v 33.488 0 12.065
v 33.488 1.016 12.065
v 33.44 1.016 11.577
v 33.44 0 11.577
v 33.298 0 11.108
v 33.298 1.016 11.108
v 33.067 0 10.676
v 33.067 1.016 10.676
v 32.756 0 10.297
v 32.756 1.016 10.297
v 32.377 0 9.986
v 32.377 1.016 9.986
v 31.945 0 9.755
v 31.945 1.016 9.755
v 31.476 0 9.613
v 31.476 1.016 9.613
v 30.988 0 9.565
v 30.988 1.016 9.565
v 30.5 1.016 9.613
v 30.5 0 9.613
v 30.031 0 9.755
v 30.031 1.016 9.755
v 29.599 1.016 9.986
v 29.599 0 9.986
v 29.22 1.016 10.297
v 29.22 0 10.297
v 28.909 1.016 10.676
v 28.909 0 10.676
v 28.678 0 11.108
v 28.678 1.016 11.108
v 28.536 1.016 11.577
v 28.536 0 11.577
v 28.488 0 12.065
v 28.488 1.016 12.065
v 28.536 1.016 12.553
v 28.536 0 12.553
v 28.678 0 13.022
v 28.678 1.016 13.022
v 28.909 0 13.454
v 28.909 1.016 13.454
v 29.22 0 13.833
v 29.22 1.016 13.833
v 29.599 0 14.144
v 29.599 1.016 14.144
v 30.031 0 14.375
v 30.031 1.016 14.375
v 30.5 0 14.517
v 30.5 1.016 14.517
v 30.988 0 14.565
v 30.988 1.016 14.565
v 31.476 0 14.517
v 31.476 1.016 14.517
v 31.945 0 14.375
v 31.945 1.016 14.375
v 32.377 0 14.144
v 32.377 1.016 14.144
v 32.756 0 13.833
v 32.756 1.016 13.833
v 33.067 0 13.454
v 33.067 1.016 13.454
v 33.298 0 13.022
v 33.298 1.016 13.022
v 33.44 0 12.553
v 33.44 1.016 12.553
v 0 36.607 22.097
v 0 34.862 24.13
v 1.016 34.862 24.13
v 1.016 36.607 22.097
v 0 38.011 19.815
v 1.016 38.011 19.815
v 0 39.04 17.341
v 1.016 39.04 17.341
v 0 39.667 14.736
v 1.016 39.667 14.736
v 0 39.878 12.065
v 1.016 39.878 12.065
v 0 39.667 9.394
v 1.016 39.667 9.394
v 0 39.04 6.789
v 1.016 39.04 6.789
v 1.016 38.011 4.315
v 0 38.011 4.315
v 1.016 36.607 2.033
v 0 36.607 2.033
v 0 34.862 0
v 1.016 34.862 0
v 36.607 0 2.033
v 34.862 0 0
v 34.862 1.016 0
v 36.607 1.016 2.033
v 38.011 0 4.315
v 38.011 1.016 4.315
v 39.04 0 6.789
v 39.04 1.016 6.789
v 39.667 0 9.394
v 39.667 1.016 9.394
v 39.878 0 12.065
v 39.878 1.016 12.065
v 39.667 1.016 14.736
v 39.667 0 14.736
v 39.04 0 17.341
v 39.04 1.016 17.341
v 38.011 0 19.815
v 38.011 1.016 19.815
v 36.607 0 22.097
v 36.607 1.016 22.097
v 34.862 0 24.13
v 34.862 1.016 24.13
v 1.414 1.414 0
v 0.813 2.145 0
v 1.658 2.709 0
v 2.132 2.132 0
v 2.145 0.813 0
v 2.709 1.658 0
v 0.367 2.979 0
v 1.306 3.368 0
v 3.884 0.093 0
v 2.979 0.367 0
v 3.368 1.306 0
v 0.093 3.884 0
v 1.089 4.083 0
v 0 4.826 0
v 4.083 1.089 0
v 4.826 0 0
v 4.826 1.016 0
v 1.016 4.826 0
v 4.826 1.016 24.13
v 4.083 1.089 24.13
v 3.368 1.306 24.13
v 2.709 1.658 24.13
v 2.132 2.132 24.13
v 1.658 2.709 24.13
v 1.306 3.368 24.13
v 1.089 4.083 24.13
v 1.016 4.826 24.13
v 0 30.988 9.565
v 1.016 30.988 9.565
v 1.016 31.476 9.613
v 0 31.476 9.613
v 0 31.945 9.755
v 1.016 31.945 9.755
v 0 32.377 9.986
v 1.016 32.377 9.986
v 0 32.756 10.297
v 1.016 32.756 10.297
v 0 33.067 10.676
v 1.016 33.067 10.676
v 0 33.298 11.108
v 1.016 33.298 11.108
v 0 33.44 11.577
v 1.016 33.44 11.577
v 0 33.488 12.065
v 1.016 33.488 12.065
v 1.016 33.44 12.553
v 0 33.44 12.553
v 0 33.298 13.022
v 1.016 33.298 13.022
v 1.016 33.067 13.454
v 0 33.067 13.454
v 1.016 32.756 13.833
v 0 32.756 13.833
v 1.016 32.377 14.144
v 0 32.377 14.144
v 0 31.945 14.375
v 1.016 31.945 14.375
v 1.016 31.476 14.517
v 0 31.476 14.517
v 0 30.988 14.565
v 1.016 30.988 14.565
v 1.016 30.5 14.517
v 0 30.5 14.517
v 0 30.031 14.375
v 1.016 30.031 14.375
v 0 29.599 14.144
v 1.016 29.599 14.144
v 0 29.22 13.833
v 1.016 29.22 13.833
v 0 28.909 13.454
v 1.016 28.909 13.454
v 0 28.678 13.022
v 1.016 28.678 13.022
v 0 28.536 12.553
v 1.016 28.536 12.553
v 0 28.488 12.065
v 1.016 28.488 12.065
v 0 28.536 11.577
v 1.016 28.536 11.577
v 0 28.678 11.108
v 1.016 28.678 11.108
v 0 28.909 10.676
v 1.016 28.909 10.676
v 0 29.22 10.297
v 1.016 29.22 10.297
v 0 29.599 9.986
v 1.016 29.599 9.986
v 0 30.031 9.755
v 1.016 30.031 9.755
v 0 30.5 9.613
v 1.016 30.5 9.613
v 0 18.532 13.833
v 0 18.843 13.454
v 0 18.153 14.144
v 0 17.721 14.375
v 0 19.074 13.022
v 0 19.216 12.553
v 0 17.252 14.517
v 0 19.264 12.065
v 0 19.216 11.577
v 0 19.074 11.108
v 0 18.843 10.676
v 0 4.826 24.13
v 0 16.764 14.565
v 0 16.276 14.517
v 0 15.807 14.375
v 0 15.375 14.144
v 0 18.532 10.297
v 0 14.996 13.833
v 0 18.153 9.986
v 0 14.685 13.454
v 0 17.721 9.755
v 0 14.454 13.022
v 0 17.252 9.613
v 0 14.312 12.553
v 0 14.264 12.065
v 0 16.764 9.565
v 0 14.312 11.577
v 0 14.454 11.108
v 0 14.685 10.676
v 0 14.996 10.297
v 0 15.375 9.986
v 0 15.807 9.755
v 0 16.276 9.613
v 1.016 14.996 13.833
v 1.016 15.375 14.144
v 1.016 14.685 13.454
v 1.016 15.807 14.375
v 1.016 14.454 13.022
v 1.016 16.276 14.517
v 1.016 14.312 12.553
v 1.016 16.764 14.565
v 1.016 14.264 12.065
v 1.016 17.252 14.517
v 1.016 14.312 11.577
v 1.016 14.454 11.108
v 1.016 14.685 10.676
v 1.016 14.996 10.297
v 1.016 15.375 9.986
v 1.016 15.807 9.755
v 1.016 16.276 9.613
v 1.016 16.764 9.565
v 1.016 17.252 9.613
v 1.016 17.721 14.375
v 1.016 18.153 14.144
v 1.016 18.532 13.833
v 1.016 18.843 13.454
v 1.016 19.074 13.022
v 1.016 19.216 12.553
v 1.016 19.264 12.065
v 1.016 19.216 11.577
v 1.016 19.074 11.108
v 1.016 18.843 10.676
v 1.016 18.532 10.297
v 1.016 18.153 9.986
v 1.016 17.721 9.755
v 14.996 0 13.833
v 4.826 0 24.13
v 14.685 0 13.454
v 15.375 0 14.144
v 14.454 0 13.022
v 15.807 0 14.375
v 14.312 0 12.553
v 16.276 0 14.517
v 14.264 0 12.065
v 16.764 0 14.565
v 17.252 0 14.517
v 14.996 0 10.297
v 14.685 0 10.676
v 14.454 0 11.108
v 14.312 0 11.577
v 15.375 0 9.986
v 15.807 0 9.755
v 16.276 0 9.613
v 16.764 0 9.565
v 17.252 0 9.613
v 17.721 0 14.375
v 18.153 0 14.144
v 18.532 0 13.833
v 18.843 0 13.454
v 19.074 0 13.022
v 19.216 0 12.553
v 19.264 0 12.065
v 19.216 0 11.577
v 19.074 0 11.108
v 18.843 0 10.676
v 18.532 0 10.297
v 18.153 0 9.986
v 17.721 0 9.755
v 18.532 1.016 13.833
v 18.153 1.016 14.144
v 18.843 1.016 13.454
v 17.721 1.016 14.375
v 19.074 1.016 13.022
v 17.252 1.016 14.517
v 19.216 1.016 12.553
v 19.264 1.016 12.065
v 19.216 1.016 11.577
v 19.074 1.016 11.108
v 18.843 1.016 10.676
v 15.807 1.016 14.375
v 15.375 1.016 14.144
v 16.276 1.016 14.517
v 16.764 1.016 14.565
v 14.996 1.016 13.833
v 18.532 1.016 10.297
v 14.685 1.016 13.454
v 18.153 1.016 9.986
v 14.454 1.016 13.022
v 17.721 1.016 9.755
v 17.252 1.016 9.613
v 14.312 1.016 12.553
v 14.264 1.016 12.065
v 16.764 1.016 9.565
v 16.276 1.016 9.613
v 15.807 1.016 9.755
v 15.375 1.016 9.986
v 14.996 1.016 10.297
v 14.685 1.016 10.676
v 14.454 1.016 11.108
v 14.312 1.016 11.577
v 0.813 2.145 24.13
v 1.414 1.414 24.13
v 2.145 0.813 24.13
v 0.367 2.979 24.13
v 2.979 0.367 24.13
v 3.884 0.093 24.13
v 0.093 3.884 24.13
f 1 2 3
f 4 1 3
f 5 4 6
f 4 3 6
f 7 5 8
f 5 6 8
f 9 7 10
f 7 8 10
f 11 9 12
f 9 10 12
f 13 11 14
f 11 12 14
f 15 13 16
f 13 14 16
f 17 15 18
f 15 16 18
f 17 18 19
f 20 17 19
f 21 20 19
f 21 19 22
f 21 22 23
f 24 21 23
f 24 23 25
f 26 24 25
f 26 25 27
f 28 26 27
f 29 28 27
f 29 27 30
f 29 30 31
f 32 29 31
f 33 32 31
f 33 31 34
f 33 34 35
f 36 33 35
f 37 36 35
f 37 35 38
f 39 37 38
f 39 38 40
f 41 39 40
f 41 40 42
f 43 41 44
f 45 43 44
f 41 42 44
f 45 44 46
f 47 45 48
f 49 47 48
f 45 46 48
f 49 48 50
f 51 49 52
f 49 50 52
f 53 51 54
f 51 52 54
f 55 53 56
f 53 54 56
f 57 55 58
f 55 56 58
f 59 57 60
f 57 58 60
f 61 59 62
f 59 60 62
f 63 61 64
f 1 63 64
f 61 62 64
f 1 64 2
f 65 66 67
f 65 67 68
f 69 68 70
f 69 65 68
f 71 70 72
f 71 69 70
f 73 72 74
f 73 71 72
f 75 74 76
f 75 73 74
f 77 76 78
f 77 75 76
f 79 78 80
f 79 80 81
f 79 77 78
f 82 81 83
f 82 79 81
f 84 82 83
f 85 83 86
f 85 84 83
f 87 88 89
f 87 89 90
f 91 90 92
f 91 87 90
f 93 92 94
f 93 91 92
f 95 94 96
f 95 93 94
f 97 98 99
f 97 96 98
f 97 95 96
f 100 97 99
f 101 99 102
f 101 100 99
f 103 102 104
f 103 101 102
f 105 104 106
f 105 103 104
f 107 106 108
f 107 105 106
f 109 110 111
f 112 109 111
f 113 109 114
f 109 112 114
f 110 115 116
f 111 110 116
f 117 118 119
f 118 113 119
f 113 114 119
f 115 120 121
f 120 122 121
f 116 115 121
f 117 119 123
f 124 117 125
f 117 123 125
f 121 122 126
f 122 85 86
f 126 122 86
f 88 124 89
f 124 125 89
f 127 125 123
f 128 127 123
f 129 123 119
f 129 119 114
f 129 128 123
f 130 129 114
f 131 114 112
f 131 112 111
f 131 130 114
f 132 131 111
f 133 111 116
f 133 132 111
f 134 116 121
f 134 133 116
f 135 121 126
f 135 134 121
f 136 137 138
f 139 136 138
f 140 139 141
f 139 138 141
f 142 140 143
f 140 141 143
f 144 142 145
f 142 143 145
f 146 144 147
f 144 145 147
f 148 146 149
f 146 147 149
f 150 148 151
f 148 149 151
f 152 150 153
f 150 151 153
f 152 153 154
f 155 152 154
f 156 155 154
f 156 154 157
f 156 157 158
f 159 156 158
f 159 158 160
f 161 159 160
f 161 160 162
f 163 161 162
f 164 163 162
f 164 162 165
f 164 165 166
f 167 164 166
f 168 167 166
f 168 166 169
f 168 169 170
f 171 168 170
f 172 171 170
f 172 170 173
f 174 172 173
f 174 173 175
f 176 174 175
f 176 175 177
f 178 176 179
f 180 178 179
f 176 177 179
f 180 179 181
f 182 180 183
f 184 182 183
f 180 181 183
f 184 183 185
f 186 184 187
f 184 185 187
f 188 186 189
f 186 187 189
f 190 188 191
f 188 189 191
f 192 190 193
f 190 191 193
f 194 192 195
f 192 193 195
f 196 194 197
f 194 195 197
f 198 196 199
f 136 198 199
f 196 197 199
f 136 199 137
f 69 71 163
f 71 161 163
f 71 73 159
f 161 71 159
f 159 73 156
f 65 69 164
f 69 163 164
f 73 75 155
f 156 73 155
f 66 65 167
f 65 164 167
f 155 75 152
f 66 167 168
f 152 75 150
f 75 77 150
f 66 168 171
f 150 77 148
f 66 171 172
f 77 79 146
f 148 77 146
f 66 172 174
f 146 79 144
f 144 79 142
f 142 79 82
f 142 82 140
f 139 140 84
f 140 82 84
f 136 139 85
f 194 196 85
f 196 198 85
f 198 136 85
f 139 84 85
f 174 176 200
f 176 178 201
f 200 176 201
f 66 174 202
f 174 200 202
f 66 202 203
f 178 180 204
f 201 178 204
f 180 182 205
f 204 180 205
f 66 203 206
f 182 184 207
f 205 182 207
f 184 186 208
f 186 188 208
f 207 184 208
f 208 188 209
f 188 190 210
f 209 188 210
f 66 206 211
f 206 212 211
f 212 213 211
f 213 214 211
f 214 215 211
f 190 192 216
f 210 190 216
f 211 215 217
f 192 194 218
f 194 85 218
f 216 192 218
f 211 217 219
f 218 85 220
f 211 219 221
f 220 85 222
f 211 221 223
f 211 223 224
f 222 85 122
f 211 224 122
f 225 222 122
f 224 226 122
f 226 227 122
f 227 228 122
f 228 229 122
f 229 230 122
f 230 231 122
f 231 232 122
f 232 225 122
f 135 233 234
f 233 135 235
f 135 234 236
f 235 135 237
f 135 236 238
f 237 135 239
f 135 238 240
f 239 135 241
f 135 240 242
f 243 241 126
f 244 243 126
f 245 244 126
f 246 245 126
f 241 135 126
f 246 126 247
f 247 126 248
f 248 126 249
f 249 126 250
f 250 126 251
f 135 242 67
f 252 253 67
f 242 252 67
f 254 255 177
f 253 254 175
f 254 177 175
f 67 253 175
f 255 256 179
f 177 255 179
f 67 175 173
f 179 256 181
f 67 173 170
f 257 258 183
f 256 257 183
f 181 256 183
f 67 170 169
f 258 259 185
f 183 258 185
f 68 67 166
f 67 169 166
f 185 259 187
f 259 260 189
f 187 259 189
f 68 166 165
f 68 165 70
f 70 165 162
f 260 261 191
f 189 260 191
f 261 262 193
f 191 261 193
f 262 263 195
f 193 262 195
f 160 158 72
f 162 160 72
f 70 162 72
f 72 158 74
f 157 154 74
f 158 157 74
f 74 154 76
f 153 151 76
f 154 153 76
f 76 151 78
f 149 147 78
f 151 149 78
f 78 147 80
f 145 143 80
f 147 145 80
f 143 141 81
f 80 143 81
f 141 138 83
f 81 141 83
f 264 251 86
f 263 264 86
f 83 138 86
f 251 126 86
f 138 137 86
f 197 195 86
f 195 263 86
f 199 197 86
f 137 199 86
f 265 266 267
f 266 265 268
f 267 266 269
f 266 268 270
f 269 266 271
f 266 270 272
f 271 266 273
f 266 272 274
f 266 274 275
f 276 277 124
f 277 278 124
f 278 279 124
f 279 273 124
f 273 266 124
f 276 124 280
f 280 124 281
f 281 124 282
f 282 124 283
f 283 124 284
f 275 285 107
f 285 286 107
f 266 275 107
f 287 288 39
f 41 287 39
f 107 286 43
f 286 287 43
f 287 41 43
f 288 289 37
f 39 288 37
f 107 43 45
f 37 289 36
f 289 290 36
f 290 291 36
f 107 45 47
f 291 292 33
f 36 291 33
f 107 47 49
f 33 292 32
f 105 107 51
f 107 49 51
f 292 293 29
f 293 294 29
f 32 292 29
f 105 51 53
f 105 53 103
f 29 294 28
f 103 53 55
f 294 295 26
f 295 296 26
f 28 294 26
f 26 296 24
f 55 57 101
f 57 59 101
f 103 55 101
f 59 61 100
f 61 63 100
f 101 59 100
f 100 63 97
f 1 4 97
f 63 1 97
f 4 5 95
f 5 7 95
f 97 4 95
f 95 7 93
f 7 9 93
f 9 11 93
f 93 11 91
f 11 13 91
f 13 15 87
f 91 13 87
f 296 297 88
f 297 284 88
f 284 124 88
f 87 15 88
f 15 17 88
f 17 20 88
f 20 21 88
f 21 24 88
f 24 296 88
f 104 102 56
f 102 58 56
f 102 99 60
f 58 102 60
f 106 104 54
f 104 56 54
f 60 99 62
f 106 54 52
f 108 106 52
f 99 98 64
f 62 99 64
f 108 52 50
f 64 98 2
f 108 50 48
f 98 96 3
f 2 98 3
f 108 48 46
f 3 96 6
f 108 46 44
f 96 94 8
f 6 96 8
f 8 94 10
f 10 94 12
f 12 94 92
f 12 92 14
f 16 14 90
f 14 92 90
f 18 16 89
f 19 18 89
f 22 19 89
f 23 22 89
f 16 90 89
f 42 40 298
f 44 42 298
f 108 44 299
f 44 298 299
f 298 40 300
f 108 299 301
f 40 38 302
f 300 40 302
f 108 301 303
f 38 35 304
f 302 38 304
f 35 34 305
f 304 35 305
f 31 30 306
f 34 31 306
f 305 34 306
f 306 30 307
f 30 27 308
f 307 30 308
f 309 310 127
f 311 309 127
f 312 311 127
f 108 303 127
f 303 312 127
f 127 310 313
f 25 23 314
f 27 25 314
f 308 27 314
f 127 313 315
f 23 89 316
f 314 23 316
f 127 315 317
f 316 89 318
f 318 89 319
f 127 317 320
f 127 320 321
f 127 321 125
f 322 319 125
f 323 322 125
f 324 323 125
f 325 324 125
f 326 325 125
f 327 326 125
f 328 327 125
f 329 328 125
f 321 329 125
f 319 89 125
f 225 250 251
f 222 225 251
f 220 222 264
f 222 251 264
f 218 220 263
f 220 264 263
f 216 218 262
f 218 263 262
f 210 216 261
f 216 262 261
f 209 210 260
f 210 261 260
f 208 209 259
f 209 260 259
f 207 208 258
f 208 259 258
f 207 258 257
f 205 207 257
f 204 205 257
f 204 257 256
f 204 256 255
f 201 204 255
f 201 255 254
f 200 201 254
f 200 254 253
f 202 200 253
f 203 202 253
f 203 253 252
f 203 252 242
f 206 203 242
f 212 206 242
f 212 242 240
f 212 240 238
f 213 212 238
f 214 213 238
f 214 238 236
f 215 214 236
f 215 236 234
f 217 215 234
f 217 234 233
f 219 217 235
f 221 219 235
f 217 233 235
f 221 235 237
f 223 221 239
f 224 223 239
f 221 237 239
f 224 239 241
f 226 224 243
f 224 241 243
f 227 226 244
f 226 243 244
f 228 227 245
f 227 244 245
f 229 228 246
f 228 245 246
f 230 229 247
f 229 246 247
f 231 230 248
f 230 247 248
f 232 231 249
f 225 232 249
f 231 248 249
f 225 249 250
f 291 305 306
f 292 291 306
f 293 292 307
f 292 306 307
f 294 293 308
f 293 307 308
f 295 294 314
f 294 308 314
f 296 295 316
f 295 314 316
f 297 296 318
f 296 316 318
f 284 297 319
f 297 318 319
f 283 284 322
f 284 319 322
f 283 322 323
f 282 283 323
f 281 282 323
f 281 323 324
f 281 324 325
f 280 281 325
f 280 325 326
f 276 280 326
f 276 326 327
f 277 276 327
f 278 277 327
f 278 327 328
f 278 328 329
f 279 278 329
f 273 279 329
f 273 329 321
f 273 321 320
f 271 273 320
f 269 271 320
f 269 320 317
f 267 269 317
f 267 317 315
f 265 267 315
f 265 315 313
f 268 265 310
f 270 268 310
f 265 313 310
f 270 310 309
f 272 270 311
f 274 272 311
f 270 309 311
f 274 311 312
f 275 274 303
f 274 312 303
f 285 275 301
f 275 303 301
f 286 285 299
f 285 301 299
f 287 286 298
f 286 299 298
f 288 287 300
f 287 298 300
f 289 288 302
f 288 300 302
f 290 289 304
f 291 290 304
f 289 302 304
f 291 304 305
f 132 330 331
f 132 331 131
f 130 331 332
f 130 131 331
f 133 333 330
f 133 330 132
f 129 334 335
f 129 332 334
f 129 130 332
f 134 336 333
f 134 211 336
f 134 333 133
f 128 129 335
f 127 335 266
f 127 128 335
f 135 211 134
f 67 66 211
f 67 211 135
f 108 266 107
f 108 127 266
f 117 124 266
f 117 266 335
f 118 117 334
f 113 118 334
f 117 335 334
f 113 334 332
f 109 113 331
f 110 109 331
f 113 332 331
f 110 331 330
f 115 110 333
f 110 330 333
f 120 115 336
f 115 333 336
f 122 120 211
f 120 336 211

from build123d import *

# Parameters (mm, degrees)
BOSS_EXTRUDE1_DEPTH   = 24.13
FILLET1_R             = 3.81
FILLET2_R             = 4.826
F_5_0MM_DOWEL_HOLE1_D = 5
F_5_0MM_DOWEL_HOLE2_D = 5
CUT_EXTRUDE1_DEPTH    = 40.878
CUT_EXTRUDE2_DEPTH    = 40.878


with BuildPart() as part:
    # Sketch1 → Boss-Extrude1 (new body)
    with BuildSketch(Plane.XY):
        Polygon((0, 39.878), (0, 0), (39.878, 0), (39.878, 1.016), (1.016, 1.016), (1.016, 39.878), align=None)
    extrude(amount=BOSS_EXTRUDE1_DEPTH)

    # Fillet1
    fillet1_edges = [part.edges().sort_by_distance(p)[0] for p in [
        (1.016, 1.016, 12.065),
    ]]
    fillet(fillet1_edges, radius=FILLET1_R)

    # Fillet2
    fillet2_edges = [part.edges().sort_by_distance(p)[0] for p in [
        (0, 0, 12.065),
    ]]
    fillet(fillet2_edges, radius=FILLET2_R)

    # Ø5.0mm Dowel Hole1 (through all)
    with Locations(Plane.ZY):
        with Locations((12.065, 30.988), (12.065, 16.764)):
            Hole(F_5_0MM_DOWEL_HOLE1_D / 2)

    # Ø5.0mm Dowel Hole2 (through all)
    with Locations(Plane(origin=(0, 0, 0), x_dir=(-1, 0, 0), z_dir=(0, -1, 0))):
        with Locations((-30.988, -12.065), (-16.764, -12.065)):
            Hole(F_5_0MM_DOWEL_HOLE2_D / 2)

    # Sketch6 → Cut-Extrude1 (cut, through all)
    with BuildSketch(Plane.XZ):
        with BuildLine():
            Line((34.862003958, 24.13), (44.45, 24.13))
            Line((44.45, 24.13), (44.45, 0))
            Line((44.45, 0), (34.862003958, 0))
            ThreePointArc((34.862003958, 0), (39.878, 12.065), (34.862003958, 24.13))
        make_face()
    extrude(amount=-CUT_EXTRUDE1_DEPTH, mode=Mode.SUBTRACT)

    # Sketch7 → Cut-Extrude2 (cut, through all)
    with BuildSketch(Plane.ZY):
        with BuildLine():
            Line((0, 34.862003958), (0, 44.45))
            Line((0, 44.45), (24.13, 44.45))
            Line((24.13, 44.45), (24.13, 34.862003958))
            ThreePointArc((24.13, 34.862003958), (12.065, 39.878), (0, 34.862003958))
        make_face()
    extrude(amount=-CUT_EXTRUDE2_DEPTH, mode=Mode.SUBTRACT)


solid = part.part
